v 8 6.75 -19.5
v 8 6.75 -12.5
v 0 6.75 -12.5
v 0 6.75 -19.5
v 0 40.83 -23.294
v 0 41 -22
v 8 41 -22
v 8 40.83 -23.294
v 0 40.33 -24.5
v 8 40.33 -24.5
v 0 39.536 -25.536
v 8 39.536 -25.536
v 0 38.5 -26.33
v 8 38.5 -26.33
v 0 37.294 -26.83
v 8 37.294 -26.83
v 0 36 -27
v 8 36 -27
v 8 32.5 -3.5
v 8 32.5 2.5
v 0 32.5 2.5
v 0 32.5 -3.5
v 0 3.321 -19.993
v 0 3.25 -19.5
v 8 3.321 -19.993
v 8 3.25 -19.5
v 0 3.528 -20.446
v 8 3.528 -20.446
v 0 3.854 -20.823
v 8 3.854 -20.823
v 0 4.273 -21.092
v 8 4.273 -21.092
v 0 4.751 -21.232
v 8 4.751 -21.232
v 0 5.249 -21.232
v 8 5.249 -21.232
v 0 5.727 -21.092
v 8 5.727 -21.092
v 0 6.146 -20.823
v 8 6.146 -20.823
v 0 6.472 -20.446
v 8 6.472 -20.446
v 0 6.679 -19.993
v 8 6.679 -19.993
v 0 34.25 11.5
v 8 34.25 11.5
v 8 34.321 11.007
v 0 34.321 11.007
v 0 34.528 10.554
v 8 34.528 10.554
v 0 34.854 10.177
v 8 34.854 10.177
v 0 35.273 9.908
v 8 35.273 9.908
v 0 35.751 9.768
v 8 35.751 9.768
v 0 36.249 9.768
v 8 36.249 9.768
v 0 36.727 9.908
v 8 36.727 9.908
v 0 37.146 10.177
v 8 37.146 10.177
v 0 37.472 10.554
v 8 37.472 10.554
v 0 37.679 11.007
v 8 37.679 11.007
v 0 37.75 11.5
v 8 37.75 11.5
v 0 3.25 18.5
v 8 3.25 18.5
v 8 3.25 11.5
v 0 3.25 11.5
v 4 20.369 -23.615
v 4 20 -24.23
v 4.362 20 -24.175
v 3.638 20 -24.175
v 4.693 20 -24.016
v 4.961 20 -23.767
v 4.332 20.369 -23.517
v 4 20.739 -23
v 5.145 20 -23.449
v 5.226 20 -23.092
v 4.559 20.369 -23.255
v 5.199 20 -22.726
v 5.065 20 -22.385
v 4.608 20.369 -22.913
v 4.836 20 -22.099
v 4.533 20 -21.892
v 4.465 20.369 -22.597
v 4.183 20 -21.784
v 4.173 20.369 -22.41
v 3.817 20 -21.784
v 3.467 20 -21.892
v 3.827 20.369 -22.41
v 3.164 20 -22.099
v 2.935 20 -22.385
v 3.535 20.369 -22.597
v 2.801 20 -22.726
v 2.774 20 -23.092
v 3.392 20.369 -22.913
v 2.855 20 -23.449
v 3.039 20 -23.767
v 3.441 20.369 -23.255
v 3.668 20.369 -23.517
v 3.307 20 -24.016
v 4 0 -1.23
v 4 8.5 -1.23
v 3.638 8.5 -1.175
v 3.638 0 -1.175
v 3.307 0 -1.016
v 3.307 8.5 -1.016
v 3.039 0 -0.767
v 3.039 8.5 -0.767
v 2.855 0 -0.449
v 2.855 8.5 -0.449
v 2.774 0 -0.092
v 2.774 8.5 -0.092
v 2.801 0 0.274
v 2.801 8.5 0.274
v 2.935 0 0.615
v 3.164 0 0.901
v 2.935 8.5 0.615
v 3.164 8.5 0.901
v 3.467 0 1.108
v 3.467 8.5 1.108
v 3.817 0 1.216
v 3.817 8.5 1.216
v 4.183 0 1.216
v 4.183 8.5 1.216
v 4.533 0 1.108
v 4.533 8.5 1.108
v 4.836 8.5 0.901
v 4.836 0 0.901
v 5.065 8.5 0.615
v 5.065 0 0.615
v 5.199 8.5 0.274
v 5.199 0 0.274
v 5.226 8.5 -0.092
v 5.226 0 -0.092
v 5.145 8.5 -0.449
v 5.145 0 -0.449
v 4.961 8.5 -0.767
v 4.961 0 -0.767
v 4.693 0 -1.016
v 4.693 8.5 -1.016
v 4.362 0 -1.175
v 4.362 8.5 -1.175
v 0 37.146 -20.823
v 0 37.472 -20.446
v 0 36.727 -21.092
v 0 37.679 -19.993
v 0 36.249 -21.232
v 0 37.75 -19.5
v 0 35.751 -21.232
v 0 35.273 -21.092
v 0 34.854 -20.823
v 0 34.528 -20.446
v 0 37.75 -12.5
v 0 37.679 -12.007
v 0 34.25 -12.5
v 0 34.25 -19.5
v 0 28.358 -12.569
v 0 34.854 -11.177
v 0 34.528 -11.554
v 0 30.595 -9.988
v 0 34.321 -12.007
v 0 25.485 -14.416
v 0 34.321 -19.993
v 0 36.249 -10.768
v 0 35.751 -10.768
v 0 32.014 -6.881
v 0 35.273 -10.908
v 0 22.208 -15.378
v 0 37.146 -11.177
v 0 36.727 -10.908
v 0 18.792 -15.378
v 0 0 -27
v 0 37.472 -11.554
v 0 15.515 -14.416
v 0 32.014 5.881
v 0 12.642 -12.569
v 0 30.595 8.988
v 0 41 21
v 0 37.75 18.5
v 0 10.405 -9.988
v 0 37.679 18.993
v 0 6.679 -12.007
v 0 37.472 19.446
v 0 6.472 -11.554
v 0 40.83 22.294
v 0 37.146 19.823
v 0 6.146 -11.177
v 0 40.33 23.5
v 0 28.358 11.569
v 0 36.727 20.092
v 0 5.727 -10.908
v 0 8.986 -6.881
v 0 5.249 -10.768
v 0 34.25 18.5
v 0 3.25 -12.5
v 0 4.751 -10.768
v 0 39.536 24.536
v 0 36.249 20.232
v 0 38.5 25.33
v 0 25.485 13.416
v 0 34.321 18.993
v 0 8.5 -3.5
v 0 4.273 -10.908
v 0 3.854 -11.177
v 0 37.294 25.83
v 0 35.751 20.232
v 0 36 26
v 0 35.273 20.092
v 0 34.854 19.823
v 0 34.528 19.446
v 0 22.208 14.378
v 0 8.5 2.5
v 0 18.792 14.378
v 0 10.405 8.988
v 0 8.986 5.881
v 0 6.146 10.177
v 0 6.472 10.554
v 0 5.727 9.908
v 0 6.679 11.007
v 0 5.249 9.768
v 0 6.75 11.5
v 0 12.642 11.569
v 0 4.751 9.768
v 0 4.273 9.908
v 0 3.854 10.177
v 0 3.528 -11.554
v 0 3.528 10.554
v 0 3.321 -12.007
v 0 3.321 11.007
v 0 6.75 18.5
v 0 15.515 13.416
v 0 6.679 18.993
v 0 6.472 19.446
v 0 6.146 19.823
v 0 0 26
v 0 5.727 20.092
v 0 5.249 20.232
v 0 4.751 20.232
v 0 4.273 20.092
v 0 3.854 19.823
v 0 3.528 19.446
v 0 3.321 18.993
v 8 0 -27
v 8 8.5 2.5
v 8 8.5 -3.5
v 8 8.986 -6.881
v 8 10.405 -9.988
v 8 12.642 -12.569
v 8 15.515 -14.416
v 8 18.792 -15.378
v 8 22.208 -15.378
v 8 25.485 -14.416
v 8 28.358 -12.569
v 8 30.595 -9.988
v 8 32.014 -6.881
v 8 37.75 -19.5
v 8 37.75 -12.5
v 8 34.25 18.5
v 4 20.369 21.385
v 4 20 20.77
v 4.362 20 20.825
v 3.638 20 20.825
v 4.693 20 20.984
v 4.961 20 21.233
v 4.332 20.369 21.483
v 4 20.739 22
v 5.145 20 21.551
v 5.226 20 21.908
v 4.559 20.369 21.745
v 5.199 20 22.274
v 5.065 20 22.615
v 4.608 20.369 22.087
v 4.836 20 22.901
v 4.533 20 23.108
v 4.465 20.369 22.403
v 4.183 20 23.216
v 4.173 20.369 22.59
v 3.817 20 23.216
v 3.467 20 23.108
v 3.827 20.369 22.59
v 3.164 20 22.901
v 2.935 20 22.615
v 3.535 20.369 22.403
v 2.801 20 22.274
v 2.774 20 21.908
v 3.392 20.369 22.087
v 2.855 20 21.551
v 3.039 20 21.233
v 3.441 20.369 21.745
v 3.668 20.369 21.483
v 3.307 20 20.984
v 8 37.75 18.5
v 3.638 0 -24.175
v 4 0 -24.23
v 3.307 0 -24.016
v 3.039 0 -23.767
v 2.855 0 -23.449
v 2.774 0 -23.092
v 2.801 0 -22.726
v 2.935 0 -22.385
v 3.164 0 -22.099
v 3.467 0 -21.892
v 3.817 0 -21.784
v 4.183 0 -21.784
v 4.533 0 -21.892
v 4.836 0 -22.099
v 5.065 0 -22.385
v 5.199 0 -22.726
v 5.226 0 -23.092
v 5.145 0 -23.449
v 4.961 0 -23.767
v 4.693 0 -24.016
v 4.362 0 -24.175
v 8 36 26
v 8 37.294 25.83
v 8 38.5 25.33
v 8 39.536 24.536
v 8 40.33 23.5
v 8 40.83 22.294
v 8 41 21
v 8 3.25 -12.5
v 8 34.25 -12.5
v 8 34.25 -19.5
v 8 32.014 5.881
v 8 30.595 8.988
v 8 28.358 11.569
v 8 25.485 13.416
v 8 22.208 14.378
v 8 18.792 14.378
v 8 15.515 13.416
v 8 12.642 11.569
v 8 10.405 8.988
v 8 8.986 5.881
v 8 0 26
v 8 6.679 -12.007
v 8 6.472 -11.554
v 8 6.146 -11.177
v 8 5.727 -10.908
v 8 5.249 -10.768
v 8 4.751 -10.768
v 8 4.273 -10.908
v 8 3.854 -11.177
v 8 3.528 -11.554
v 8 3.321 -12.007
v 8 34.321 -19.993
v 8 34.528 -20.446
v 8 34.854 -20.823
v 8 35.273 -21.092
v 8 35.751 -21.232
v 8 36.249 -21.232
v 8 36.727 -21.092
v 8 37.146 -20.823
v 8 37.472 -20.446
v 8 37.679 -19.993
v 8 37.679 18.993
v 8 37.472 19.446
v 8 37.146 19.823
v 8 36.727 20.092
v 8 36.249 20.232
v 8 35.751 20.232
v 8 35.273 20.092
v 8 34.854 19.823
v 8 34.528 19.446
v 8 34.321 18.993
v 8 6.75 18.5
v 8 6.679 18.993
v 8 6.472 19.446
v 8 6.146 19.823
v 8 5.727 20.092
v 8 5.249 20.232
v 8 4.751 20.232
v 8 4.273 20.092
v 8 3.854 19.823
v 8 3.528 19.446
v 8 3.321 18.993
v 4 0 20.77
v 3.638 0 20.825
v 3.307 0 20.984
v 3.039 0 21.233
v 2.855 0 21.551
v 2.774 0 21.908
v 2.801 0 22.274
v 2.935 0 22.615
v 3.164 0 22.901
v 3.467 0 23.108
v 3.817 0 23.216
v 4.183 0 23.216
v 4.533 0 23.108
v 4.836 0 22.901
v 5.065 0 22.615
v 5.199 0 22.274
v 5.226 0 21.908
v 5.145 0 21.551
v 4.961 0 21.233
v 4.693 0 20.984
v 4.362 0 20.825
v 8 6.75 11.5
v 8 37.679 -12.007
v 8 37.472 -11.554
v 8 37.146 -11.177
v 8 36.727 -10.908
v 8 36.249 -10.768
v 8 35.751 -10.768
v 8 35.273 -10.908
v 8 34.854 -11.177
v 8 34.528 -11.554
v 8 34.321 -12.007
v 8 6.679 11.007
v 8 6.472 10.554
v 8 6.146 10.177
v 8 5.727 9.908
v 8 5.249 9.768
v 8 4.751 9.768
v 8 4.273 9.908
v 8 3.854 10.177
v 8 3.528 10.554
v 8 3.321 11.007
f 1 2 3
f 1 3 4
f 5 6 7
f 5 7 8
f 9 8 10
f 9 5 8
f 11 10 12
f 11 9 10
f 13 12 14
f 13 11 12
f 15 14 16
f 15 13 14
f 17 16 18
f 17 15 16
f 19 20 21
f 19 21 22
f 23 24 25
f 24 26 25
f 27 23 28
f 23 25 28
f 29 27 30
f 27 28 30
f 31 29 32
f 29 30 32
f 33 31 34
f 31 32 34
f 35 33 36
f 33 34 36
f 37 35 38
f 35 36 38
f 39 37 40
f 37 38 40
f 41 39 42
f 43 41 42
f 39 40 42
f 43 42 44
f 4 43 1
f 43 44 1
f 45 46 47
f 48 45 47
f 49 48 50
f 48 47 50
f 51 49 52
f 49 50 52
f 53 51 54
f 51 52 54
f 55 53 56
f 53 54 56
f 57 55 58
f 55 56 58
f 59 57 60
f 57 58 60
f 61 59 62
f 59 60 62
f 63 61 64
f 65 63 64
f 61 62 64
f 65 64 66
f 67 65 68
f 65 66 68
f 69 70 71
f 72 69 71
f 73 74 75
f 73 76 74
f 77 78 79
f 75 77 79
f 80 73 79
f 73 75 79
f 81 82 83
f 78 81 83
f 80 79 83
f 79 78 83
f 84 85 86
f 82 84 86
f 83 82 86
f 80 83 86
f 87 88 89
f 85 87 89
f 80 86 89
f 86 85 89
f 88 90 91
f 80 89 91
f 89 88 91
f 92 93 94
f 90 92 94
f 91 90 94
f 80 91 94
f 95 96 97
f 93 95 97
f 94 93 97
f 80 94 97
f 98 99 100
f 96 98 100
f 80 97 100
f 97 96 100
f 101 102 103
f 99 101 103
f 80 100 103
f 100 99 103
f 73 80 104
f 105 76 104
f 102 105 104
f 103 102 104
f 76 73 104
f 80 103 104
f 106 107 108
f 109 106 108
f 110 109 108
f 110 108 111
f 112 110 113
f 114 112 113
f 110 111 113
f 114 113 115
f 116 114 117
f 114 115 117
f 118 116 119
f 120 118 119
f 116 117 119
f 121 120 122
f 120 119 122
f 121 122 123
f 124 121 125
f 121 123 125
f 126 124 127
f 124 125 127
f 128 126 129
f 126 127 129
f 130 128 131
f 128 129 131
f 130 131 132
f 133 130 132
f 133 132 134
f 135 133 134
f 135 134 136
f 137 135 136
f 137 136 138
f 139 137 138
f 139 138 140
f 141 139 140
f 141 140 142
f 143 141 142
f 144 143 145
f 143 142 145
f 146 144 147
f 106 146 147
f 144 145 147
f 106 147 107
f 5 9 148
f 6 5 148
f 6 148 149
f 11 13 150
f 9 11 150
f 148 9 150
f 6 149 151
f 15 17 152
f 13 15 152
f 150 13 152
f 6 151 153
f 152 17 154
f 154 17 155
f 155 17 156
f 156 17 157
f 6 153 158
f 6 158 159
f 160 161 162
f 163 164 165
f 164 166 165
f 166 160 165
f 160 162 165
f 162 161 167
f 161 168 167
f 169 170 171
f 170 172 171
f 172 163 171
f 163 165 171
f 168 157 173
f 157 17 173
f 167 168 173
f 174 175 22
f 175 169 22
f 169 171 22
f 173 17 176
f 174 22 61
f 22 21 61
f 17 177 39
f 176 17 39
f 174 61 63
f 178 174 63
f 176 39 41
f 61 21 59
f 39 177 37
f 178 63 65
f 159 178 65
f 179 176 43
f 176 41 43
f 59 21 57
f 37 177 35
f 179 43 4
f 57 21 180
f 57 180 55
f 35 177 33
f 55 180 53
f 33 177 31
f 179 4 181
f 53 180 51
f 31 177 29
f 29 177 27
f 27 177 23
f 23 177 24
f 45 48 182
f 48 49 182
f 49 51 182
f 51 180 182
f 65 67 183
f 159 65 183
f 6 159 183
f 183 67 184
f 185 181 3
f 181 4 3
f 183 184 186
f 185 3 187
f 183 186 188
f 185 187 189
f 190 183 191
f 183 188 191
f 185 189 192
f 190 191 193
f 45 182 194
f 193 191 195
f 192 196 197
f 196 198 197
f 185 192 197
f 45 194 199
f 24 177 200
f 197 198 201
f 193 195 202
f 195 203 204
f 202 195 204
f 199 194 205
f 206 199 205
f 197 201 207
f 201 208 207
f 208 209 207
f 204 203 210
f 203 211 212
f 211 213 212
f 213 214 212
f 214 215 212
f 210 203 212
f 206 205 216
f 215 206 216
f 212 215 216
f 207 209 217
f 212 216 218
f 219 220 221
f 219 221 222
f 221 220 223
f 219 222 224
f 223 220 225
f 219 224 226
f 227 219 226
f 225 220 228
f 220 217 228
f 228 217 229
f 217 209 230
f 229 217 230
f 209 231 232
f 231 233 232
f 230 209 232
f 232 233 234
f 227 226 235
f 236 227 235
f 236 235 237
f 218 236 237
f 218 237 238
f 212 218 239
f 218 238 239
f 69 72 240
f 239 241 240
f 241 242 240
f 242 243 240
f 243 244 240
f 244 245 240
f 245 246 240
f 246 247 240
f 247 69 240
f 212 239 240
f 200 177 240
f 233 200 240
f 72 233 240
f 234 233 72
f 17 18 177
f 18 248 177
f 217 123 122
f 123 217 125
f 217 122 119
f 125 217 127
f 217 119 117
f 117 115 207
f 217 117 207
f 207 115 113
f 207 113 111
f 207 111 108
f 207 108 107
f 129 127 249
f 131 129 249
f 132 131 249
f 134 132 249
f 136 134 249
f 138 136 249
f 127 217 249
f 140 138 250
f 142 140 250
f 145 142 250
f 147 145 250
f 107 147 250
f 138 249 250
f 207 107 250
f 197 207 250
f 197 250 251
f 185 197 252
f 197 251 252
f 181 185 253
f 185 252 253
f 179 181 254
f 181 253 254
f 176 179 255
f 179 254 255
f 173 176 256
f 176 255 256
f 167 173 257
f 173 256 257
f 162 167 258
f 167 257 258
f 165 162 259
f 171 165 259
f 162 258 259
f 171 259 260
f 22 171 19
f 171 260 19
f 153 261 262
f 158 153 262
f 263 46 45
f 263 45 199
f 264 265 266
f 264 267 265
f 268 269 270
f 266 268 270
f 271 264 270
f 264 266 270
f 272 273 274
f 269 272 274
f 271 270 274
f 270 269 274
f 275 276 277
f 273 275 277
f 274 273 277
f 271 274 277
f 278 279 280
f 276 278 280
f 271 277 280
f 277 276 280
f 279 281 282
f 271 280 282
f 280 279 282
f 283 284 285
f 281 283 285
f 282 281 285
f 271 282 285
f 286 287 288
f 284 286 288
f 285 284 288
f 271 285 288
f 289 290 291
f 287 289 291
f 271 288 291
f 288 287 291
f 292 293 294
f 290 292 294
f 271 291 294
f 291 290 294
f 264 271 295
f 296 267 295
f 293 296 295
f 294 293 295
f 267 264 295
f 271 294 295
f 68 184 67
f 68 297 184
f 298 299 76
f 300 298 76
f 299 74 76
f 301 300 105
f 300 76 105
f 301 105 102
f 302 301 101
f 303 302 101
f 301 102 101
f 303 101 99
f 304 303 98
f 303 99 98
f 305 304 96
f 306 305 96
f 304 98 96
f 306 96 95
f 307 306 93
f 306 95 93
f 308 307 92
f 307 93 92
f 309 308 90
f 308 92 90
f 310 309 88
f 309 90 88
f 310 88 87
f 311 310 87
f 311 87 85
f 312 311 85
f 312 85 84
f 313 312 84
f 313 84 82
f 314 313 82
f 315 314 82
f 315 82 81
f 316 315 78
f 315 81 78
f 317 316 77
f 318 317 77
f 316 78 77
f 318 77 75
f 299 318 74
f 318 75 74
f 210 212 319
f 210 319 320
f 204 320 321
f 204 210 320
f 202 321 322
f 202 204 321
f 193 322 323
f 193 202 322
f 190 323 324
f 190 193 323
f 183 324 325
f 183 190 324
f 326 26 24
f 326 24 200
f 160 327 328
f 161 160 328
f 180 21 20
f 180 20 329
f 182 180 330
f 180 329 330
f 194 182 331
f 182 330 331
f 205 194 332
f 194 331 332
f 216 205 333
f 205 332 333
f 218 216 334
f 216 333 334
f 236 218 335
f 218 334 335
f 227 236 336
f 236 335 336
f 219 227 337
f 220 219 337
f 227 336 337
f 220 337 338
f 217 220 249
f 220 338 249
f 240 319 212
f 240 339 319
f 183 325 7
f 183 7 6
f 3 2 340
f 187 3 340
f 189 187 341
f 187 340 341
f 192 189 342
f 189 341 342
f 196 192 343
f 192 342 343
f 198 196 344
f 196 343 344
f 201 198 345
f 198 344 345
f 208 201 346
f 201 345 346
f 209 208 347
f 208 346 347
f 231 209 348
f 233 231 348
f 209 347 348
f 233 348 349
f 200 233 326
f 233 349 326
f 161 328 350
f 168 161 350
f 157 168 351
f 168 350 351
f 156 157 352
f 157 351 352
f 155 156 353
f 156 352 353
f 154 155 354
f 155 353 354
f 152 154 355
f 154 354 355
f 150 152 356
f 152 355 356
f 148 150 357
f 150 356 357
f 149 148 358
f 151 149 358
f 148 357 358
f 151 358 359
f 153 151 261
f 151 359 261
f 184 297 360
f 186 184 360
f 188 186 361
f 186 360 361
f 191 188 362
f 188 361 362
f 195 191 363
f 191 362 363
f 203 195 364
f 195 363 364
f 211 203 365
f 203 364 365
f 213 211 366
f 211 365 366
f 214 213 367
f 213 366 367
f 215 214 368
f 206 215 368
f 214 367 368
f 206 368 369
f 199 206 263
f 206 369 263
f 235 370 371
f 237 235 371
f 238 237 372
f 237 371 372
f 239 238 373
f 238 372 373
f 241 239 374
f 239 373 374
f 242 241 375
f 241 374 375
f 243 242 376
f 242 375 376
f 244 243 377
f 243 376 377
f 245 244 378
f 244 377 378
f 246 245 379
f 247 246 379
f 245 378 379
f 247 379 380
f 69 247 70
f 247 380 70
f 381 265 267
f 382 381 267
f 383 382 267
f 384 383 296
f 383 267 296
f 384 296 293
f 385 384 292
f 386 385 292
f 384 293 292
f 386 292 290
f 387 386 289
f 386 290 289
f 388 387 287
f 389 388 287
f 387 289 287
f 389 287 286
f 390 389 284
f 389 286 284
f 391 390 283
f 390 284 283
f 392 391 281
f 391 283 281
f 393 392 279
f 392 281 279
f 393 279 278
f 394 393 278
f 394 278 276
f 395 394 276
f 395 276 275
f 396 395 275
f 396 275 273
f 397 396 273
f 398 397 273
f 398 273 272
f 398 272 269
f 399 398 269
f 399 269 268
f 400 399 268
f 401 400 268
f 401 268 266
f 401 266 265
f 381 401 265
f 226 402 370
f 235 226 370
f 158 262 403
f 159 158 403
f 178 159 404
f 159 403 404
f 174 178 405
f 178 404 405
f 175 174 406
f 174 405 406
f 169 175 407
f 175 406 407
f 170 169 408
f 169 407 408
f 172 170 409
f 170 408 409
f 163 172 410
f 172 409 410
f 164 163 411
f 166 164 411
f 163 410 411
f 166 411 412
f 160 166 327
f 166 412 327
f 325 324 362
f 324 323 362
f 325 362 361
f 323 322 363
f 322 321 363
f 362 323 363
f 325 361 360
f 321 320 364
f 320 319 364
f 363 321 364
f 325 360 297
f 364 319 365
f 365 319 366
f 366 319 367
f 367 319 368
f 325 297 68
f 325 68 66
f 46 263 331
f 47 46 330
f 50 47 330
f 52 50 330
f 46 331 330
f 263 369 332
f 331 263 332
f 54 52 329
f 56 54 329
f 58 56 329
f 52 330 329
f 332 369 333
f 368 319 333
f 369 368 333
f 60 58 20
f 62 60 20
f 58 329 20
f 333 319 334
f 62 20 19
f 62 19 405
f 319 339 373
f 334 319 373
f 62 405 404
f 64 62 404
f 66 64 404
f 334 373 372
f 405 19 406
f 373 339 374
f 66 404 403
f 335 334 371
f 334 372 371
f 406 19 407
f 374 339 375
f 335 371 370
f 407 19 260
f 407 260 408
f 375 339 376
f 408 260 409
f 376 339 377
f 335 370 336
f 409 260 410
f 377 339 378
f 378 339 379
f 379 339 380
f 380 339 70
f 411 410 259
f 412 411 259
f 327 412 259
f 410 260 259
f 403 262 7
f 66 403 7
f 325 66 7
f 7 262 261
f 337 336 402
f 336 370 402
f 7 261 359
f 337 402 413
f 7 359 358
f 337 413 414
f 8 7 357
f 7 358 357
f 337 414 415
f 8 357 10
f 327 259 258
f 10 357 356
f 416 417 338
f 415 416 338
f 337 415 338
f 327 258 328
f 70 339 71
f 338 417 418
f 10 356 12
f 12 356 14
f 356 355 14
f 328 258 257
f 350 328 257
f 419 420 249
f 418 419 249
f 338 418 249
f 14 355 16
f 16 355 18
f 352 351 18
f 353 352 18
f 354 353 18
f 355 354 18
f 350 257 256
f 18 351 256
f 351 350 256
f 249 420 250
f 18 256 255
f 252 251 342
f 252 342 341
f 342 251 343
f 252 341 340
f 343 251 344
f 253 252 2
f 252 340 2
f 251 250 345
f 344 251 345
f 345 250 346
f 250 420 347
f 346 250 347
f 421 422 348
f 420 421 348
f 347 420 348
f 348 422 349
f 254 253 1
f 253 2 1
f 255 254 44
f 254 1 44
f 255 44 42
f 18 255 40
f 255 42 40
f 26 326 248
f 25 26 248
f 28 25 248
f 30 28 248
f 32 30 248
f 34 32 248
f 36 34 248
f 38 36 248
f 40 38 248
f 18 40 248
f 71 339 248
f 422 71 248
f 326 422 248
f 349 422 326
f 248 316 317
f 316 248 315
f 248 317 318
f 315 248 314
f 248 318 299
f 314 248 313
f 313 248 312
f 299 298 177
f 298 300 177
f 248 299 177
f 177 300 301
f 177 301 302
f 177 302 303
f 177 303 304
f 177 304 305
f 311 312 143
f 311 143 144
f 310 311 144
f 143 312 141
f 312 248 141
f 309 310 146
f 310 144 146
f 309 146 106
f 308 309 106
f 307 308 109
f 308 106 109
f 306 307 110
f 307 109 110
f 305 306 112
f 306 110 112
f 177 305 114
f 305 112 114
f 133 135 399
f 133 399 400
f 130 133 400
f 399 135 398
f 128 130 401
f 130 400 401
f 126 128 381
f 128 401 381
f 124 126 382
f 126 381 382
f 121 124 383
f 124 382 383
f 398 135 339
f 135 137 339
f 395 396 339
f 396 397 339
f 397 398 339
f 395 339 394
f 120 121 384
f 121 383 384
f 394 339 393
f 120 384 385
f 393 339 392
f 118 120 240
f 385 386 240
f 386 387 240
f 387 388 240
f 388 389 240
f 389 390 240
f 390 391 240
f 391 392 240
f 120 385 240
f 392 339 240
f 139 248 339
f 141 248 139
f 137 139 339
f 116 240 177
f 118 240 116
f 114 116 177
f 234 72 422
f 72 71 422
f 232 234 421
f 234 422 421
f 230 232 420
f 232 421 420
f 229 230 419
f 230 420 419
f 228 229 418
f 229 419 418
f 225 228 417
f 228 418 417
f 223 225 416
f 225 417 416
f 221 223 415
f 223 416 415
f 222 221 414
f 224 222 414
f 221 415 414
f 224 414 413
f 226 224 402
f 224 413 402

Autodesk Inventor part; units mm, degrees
ref_plane "YZ Plane" through (0, 0, 0) normal (1, 0, 0) x (0, 1, 0)
ref_plane "XZ Plane" through (0, 0, 0) normal (0, 1, 0) x (-1, 0, 0)
ref_plane "XY Plane" through (0, 0, 0) normal (0, 0, 1) x (1, 0, 0)
sketch "Sketch1" plane through (0, 0, 0) normal (0, 1, 0) x (-1, 0, 0)
  line L0 (0, 0) -> (-8, 0)
  line L1 (-8, 0) -> (-8, -27)
  line L2 (-8, -27) -> (0, -27)
  line L3 (0, -27) -> (0, 0)
  line L4 (0, 0) -> (-8, 0)
  line L5 (-8, 0) -> (-8, 26)
  line L6 (-8, 26) -> (0, 26)
  line L7 (0, 26) -> (0, 0)
  dimension "d0" = 8
  dimension "d3" = 27
  dimension "d4" = 26
extrude "Extrusion1" add sketch "Sketch1" along normal blind 41
sketch "Sketch2" plane through (8, 0, 26) normal (1, 0, 0) x (0, 0, -1)
  circle A0 centre (26.5, 20.5) radius 7.5 projected
  circle A1 centre (11, 36) radius 1.5 projected
  circle A2 centre (11, 5) radius 1.5 projected
  circle A3 centre (42, 36) radius 1.5 projected
  circle A4 centre (42, 5) radius 1.5 projected
  arc A5 (14.5, 34.25) -> (14.5, 37.75) centre (14.5, 36) ccw
  arc A6 (7.5, 37.75) -> (7.5, 34.25) centre (7.5, 36) ccw
  line L0 (2.4202, 36) -> (21.3421, 36) construction
  arc A7 (23.5, 32.5) -> (23.5, 8.5) centre (23.5, 20.5) ccw
  arc A8 (29.5, 8.5) -> (29.5, 32.5) centre (29.5, 20.5) ccw
  line L1 (12.5, 20.5) -> (42, 20.5) construction
  line L2 (26.5, 35.5013) -> (26.5, 5.593) construction
  circle A9 centre (42, 36) radius 1.5
  arc A10 (38.5, 37.75) -> (38.5, 34.25) centre (38.5, 36) ccw
  arc A11 (45.5, 34.25) -> (45.5, 37.75) centre (45.5, 36) ccw
  line L3 (45.5, 37.75) -> (38.5, 37.75)
  line L4 (38.5, 34.25) -> (45.5, 34.25)
  circle A12 centre (11, 5) radius 1.5
  circle A13 centre (42, 5) radius 1.5
  arc A14 (14.5, 3.25) -> (14.5, 6.75) centre (14.5, 5) ccw
  arc A15 (7.5, 6.75) -> (7.5, 3.25) centre (7.5, 5) ccw
  line L5 (7.5, 3.25) -> (14.5, 3.25)
  line L6 (14.5, 6.75) -> (7.5, 6.75)
  line L7 (2.4202, 5) -> (21.3421, 5) construction
  circle A16 centre (42, 5) radius 1.5
  arc A17 (38.5, 6.75) -> (38.5, 3.25) centre (38.5, 5) ccw
  line L8 (38.5, 6.75) -> (45.5, 6.75)
  line L9 (45.5, 3.25) -> (38.5, 3.25)
  arc A18 (45.5, 3.25) -> (45.5, 6.75) centre (45.5, 5) ccw
  line L10 (23.5, 32.5) -> (29.5, 32.5)
  line L11 (23.5, 8.5) -> (29.5, 8.5)
  line L12 (7.5, 37.75) -> (14.5, 37.75)
  line L13 (14.5, 34.25) -> (7.5, 34.25)
  point P0 (26, 0)
  point P1 (50.5798, 36)
  point P2 (26.5, 5.4987)
  point P3 (50.5798, 5)
  point P4 (11, 3.5)
  point P5 (11, 6.5)
  point P6 (42, 6.5)
  point P7 (42, 3.5)
  point P8 (42, 37.5)
  point P9 (42, 34.5)
  dimension "d8" = 3.5
  dimension "d9" = 3.5
  dimension "d10" = 3.5
  dimension "d11" = 3.5
  dimension "d14" = 3
  dimension "d15" = 3
  dimension "d16" = 12
  dimension "d17" = 12
  dimension "d33" = 3.5
extrude "Extrusion2" cut sketch "Sketch2" against normal blind 10 contours A0 | A1 | A2 | A3 | A4 | L13 A6 L12 A5 | L10 A8 L11 A7 | L3 A11 L4 A10 | L5 A15 L6 A14 | L8 A18 L9 A17
fillet "Fillet1" radius 5 2 edges at (4, 41, 26) (4, 41, -27)
sketch "Sketch3" plane through (0, 0, 0) normal (0, -1, 0) x (1, 0, 0)
  line L0 (4, 28.9228) -> (4, -37.7056) construction
  circle A0 centre (4, 22) radius 1.5
  circle A1 centre (4, -23) radius 1.5
  circle A2 centre (4, 0) radius 1.5
  line L1 (8, 26) -> (8, -27) projected
  line L2 (0, 26) -> (8, 26) projected
  line L3 (8, -27) -> (0, -27) projected
  point P0 (0, 0)
  dimension "d20" = 3
  dimension "d21" = 3
  dimension "d22" = 3
  dimension "d23" = 4
  dimension "d24" = 4
  dimension "d25" = 4
hole "Hole2" at (4, 0, 22) at (4, 0, 0) at (4, 0, -23) direction (0, 1, 0) diameter 2.459 depth 20 tip angle 118 thread size "M3x0.5" class "6H" standard "ISO Metric profile"
properties part number "Z_Motorhalter_oben"
